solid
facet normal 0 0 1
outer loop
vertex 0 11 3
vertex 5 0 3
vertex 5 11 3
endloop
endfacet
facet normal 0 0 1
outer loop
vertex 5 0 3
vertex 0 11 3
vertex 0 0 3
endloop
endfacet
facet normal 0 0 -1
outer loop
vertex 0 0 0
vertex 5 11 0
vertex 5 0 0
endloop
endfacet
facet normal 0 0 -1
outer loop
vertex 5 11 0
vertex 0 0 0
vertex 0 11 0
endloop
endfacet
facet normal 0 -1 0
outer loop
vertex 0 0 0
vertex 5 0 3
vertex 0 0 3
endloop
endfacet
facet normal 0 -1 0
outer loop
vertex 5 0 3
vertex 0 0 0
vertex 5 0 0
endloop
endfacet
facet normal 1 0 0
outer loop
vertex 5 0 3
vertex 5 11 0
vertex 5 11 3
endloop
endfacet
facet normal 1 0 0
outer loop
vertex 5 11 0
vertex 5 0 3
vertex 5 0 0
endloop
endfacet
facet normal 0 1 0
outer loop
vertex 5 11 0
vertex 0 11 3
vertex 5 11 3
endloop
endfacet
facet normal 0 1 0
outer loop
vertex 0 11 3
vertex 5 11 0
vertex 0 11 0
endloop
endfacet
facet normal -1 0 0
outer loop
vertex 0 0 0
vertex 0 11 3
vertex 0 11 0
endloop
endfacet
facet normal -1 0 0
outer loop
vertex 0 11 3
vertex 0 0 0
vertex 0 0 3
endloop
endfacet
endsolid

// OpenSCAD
// Generated by SolidPython 1.0.1 on 2020-07-29 00:46:54


cube(size = [5, 11, 3]);
/***********************************************
*********      SolidPython code:      **********
************************************************
 
# import packages: SolidPython
from solid import *
from solid.utils import *
from itertools import chain, combinations, permutations


class Resize:

    def __init__(self, scad_file):
        self.scad_file = scad_file
        #self.scad_file = import_scad(scad_file)
        # cone/cylinder param:
        self.r1 = 0
        self.r2 = 0
        self.h = 0
        # rectangular prism param:
        self.w = 0
        self.l = 0
        # ellipse param:
        self.r = 0

    # import OpenScad code (file name corresponds to shape)


    # classify shape + parameters
    def assign(self, param1, param2, param3):
        if self.scad_file == 'cone.scad':
            self.r1 = param1
            self.r2 = param2
            self.h = param3
        elif self.scad_file == 'cylinder.scad':
            self.r1 = param1
            self.r2 = param2
            self.h = param3
        elif self.scad_file == 'rectangularPrism.scad':
            self.h = param1
            self.l = param2
            self.w = param3
        else:
            self.r = param1
            self.h = param2

    # resize parameters
    def iterate(self):
        x = range(3, 20, 2)
        i = 1
        if self.scad_file == 'cone.scad':
            tempList = list(permutations(x, 2))
            for temp in tempList:
                param1 = temp[0]
                param2 = temp[1]
                filepath = 'produced_scad_files/' + 'cone' + str(param1) + '_' + str(param2) + '_' + '.scad'
                scad_render_to_file(cylinder(h=param1, r1=param2, r2=0), filepath)

        elif self.scad_file == 'cylinder.scad':
            tempList = list(permutations(x, 3))
            for temp in tempList:
                param1 = temp[0]
                param2 = temp[1]
                filepath = 'produced_scad_files/' + 'cylinder' + str(param1) + '_' + str(param2) + '_' + '.scad'
                scad_render_to_file(cylinder(h=param1, r1=param2, r2=param2), filepath)

        elif self.scad_file == 'rectangularPrism.scad':
            tempList = list(permutations(x, 3))
            for temp in tempList:
                param1 = temp[0]
                param2 = temp[1]
                param3 = temp[2]
                filepath = 'produced_scad_files/' + 'rectangularPrism' + str(param1) + '_' + str(param2) + '_' + str(
                    param3) + '.scad'
                scad_render_to_file(cube(size=(param1, param2, param3)), filepath)

        elif self.scad_file == 'ellipse.scad':
            tempList = list(permutations(x, 4))
            for temp in tempList:
                param1 = temp[0]
                param2 = temp[1]
                param3 = temp[2]
                param4 = temp[3]
                filepath = 'produced_scad_files/' + 'ellipse' + str(param1) + '_' + str(param2) + '_' + str(param3) + '_' + str(param4) + '.scad'
                scad_render_to_file(scale([param1, param2, param3])(sphere(r=param4)), filepath)

    def render_to_scadfile(self):
        scad_render_to_file(scad, 'example.scad') 
 
************************************************/
